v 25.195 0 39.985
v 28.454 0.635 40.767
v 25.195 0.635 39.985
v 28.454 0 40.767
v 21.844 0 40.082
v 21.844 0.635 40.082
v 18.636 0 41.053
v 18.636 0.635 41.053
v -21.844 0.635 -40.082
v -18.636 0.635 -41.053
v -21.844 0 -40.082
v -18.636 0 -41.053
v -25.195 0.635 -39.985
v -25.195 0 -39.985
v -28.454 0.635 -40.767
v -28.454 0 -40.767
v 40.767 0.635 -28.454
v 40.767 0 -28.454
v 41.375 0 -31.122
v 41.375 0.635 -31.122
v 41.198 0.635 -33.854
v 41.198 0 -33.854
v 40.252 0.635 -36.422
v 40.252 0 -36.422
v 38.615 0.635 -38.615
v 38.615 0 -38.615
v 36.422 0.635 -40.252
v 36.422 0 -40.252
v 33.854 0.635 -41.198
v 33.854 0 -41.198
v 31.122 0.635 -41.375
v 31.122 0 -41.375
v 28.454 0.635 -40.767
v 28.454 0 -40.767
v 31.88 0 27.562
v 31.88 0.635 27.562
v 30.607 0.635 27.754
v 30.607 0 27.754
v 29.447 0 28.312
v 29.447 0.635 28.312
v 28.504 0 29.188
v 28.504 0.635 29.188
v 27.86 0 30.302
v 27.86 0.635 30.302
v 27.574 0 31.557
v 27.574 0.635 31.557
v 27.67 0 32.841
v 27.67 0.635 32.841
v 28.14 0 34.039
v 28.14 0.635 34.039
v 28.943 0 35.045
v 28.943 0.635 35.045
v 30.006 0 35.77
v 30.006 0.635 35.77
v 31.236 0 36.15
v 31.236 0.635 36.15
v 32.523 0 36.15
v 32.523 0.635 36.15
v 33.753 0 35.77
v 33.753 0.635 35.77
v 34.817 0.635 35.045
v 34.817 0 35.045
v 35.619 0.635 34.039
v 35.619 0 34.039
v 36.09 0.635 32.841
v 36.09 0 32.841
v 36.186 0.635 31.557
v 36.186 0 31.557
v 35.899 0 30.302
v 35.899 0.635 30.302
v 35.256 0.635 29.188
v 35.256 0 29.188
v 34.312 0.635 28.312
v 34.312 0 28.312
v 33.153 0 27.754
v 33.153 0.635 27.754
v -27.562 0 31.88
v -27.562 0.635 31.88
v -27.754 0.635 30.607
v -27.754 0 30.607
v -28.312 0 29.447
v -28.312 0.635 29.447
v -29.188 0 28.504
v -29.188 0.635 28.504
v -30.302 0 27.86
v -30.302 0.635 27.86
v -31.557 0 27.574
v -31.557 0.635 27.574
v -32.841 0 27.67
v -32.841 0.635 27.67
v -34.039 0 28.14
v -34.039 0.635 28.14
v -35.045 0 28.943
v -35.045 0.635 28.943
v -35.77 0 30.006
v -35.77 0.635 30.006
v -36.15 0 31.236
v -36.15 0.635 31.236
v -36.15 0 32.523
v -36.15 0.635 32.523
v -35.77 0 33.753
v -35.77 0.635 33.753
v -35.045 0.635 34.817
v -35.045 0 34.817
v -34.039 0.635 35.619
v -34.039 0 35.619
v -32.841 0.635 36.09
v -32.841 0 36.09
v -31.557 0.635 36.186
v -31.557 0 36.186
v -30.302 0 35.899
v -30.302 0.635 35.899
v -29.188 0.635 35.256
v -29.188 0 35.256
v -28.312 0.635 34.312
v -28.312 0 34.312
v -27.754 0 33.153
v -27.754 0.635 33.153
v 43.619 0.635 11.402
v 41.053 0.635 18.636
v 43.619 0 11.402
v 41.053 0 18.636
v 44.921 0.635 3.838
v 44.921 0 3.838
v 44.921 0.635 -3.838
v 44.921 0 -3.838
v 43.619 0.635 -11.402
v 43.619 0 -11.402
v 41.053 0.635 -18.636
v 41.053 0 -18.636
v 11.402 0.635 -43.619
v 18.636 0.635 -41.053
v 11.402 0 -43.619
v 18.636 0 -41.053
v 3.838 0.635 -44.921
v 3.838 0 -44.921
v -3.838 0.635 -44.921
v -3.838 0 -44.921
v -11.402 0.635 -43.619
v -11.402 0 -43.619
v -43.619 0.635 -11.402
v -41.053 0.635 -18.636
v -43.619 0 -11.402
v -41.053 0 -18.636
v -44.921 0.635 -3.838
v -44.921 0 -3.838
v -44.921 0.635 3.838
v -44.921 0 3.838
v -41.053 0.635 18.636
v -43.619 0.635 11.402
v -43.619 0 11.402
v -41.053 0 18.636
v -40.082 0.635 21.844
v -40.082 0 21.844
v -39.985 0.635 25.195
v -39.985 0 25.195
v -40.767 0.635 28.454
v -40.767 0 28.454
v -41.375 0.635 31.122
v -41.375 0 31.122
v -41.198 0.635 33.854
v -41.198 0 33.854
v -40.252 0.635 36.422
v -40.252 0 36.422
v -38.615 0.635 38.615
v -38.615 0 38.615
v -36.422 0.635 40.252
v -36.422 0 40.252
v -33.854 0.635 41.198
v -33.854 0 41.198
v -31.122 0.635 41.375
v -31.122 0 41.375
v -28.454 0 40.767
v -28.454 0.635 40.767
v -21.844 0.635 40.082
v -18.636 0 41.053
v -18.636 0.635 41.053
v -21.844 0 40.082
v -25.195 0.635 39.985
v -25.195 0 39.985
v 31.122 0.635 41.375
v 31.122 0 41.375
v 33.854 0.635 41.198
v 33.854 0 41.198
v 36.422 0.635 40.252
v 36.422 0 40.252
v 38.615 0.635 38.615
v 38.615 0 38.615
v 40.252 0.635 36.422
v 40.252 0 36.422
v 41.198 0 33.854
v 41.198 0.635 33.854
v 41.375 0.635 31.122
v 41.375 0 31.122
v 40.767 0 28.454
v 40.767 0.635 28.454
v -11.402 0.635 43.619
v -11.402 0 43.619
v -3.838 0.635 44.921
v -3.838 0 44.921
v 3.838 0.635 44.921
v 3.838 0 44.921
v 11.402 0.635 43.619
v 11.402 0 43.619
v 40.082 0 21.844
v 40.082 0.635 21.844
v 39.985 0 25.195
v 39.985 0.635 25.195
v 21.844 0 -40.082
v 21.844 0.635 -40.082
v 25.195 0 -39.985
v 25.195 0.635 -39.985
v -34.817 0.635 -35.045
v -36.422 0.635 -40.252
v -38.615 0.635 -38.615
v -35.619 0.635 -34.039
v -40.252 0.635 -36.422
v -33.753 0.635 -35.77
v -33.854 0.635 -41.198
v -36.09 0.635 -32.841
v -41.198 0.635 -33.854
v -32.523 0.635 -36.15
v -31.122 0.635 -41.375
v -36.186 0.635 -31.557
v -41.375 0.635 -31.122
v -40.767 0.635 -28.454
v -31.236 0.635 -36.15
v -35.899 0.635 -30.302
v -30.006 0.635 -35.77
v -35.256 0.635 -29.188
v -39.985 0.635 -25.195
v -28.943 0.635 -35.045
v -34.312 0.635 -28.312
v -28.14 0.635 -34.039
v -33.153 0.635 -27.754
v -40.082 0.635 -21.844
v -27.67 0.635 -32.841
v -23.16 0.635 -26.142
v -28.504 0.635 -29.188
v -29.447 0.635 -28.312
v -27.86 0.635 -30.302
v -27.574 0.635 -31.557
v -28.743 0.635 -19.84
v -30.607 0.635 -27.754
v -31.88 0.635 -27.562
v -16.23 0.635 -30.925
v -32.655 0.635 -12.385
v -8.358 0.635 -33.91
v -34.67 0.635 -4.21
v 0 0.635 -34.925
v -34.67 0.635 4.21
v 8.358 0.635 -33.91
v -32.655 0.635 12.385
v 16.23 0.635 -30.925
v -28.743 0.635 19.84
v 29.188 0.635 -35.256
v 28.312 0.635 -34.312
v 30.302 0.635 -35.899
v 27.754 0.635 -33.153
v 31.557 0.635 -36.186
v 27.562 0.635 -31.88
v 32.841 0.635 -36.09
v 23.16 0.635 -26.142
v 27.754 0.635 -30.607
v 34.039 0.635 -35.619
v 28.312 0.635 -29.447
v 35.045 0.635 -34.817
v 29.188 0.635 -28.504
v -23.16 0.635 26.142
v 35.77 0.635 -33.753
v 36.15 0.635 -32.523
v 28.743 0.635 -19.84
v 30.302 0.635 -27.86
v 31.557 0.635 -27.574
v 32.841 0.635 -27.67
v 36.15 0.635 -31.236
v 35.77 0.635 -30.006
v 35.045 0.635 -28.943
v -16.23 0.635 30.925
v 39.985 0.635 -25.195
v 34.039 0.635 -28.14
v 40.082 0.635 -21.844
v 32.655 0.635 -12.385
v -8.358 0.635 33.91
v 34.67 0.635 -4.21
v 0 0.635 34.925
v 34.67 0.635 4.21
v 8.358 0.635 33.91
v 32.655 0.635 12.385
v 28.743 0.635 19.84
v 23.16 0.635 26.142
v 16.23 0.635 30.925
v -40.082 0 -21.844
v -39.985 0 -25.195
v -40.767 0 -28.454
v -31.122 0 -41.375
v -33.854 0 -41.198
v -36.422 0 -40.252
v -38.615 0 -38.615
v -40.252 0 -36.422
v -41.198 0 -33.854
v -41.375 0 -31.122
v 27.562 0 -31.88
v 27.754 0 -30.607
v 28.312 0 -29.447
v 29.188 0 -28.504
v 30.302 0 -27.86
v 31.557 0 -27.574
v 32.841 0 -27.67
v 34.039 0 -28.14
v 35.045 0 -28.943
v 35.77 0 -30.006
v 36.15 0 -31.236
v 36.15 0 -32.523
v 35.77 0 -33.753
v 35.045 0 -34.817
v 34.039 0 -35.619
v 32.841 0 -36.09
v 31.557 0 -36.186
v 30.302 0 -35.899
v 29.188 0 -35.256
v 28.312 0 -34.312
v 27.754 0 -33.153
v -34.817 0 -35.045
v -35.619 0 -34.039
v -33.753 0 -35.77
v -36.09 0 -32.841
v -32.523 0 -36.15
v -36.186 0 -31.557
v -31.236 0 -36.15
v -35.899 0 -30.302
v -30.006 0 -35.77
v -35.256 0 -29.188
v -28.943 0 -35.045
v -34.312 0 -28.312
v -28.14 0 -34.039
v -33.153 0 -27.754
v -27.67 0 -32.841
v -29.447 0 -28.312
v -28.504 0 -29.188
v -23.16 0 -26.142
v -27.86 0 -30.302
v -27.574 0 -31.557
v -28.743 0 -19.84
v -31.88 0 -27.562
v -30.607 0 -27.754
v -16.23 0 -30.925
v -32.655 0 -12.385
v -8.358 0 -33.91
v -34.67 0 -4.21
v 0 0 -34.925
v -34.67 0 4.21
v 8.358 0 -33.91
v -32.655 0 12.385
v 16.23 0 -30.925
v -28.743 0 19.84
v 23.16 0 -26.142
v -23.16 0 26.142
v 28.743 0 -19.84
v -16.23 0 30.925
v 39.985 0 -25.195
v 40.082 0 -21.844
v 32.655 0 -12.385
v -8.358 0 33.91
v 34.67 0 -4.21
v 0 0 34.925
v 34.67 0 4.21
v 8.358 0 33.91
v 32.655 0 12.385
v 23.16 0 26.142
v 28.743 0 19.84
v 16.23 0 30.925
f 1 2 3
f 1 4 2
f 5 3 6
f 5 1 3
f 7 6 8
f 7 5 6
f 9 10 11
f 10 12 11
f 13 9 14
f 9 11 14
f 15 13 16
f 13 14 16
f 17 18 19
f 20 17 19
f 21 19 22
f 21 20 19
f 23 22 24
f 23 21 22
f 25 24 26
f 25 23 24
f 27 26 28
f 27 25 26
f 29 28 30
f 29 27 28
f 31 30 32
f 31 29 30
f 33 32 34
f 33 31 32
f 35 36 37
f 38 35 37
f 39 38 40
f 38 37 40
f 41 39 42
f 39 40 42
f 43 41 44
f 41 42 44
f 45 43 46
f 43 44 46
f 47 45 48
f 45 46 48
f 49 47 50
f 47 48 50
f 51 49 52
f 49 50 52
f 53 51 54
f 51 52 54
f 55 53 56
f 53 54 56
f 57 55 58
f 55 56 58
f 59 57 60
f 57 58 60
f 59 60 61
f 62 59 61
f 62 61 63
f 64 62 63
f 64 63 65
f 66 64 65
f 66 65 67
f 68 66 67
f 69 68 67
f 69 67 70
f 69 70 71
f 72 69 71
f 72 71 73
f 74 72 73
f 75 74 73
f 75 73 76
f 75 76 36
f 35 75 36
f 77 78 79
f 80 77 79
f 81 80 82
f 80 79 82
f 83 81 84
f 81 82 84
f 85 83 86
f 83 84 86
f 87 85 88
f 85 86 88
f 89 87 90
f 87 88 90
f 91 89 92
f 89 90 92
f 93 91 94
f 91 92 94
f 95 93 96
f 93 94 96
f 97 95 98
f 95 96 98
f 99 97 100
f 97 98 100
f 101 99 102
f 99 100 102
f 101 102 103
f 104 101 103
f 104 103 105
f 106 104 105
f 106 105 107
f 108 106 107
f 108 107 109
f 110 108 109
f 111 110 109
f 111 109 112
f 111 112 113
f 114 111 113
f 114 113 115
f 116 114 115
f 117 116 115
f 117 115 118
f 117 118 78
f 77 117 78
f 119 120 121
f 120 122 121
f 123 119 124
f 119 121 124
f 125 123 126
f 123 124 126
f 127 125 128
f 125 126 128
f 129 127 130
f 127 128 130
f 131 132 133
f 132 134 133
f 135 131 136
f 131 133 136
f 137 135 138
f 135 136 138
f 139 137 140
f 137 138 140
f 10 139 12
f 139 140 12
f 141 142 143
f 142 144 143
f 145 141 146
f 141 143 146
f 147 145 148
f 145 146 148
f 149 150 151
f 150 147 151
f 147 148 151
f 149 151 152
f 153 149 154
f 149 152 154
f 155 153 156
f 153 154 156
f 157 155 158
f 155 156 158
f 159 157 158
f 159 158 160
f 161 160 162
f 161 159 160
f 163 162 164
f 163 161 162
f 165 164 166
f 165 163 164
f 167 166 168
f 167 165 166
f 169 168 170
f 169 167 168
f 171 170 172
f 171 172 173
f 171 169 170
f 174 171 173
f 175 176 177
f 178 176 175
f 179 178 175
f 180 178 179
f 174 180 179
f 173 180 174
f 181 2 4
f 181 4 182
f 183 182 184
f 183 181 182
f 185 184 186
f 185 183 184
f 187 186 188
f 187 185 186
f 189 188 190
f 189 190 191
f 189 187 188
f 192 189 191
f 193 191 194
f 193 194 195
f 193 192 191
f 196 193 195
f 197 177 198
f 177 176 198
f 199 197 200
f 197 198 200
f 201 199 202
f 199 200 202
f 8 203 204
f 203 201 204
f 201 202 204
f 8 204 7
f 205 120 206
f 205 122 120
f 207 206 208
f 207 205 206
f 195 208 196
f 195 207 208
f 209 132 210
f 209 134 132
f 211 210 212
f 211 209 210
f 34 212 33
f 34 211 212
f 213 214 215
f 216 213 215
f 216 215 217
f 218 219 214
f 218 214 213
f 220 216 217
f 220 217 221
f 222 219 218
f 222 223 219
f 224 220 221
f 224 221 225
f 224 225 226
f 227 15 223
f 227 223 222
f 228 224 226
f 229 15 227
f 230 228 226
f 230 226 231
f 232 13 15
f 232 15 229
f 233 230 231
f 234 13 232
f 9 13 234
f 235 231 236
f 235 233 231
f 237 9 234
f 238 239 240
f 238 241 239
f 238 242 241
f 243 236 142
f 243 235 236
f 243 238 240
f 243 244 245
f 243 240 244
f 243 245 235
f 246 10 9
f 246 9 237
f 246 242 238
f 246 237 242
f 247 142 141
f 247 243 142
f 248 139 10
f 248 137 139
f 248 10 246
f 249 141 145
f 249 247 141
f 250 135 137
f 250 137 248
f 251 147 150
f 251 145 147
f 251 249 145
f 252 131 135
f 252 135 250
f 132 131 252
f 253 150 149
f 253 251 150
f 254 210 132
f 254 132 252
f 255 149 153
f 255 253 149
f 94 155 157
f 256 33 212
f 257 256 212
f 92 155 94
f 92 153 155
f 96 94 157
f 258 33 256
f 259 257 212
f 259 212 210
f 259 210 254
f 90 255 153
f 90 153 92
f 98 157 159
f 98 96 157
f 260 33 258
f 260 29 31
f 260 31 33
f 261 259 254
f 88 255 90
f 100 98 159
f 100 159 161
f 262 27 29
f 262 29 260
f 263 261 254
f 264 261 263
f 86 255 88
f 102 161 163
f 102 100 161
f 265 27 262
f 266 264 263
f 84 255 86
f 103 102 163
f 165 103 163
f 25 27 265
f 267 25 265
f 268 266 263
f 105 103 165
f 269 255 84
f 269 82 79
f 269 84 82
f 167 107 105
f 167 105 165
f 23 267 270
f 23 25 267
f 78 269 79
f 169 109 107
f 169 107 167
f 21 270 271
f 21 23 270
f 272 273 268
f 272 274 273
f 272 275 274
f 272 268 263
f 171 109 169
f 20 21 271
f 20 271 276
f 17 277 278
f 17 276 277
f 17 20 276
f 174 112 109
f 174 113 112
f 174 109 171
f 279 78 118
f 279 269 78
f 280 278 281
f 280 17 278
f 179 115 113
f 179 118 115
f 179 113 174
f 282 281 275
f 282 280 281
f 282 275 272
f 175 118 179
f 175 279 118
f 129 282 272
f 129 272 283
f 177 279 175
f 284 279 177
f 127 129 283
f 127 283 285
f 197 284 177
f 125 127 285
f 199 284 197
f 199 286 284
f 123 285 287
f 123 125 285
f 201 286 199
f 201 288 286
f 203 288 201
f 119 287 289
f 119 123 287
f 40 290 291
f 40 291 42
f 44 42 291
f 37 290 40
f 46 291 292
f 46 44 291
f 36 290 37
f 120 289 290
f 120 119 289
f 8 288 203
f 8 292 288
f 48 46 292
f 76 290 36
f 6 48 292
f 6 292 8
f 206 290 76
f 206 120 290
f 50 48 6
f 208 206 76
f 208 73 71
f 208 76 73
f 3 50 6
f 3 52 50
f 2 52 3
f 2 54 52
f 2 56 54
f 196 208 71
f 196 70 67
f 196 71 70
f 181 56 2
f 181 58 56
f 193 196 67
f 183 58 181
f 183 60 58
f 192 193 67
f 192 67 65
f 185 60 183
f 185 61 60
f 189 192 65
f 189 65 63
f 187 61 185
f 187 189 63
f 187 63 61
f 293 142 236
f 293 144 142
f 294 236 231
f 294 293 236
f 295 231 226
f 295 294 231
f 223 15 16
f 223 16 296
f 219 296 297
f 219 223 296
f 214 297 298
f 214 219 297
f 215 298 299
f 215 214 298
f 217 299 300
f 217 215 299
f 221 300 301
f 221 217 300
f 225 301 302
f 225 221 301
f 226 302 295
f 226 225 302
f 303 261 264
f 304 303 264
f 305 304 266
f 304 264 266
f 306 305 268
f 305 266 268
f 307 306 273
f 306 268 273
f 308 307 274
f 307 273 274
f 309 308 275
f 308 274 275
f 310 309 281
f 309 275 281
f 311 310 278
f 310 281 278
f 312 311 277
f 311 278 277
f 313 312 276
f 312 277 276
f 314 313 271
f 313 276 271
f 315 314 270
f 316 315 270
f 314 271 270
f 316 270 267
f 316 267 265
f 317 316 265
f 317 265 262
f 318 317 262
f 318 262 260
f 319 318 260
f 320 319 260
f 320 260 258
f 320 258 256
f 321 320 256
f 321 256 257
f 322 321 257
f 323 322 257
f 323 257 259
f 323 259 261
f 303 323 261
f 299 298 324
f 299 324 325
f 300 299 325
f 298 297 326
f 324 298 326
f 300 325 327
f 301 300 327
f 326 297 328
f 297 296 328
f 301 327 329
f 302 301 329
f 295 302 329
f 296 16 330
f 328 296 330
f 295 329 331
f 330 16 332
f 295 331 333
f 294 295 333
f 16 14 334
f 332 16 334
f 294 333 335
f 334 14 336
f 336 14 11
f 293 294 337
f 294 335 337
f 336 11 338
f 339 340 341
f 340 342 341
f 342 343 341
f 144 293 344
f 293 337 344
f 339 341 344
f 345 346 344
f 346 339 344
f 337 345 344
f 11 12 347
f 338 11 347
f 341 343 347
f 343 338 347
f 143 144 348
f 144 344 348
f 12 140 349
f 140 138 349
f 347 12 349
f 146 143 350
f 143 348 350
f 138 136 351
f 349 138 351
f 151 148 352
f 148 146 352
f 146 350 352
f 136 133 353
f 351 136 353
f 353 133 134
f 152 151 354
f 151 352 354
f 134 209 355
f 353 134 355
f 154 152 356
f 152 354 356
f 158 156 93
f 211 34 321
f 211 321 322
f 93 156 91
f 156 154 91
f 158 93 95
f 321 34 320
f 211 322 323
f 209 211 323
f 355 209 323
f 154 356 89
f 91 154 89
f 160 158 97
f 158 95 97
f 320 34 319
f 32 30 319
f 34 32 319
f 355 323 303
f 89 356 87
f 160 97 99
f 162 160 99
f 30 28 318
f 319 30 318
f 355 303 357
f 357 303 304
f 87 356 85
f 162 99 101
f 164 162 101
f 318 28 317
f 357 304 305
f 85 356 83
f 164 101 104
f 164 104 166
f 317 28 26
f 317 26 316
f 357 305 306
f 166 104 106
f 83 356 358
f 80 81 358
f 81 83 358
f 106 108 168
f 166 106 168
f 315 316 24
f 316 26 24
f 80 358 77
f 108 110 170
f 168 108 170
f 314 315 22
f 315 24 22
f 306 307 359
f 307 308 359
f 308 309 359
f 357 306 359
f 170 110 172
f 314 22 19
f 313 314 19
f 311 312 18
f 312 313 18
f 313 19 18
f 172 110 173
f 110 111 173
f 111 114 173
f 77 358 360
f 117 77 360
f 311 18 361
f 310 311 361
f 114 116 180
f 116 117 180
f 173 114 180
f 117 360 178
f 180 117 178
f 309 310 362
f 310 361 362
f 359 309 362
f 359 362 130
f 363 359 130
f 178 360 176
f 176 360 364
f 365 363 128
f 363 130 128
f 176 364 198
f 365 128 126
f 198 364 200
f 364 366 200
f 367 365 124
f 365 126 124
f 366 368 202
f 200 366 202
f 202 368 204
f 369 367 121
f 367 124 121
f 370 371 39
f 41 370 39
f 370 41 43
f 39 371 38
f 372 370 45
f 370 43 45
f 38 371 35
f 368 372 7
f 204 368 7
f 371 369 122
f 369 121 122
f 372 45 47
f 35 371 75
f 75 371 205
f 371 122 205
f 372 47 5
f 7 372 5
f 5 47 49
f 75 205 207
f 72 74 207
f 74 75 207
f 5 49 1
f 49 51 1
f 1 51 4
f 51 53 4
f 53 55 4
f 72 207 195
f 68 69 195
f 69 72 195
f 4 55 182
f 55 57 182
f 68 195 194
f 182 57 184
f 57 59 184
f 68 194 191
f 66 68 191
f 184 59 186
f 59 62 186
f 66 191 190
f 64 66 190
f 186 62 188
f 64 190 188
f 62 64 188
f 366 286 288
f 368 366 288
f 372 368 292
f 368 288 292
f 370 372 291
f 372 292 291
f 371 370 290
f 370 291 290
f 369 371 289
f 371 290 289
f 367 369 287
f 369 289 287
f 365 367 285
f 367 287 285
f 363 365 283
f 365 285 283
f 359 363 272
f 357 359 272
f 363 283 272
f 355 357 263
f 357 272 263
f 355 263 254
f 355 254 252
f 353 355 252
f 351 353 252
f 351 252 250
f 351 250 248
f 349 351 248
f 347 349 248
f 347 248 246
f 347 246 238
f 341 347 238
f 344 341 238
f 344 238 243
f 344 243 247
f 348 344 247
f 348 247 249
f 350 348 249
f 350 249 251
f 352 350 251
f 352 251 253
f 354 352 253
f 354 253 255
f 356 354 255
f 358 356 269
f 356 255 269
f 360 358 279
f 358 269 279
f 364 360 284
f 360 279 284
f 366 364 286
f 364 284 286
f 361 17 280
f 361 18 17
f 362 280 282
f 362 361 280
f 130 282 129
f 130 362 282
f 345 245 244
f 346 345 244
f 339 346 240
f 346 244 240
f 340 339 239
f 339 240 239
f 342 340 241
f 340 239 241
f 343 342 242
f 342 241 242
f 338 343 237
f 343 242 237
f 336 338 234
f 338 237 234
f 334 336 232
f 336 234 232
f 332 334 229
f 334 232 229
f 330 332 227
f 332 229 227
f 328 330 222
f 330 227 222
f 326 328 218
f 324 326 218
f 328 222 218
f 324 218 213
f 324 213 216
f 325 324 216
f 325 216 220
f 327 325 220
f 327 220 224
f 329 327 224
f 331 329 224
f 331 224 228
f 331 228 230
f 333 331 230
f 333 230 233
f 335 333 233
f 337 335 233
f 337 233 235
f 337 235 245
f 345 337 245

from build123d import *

# Parameters (mm, degrees)
SKETCH1_R                = 45.085
BASE_EXTRUDE_DEPTH       = 0.635
SKETCH2_R                = 34.925
BASE_CUT_DEPTH           = 64.762980443
SKETCH3_R                = 9.525
CORNER_EXTRUDE_DEPTH     = 0.635
SKETCH4_R                = 4.318
CORNER_CUT_DEPTH         = 64.762980443
FILLET_2_R               = 12.7
CIRPATTERN_COUNT         = 4
FILLET_2_OF_CIRPATTERN_R = 12.7


with BuildPart() as part:
    # Sketch1 → Base Extrude (new body)
    with BuildSketch(Plane(origin=(0, 0, 0), x_dir=(1, 0, 0), z_dir=(0, 1, 0))):
        with Locations(Location((0, 0, 0), (0, 0, 270))):
            Circle(SKETCH1_R)
    extrude(amount=BASE_EXTRUDE_DEPTH)

    # Sketch2 → Base Cut (cut, through all)
    with BuildSketch(Plane(origin=(0, 0.635, 0), x_dir=(1, 0, 0), z_dir=(0, 1, 0))):
        with Locations(Location((0, 0, 0), (0, 0, 270))):
            Circle(SKETCH2_R)
    extrude(amount=-BASE_CUT_DEPTH, mode=Mode.SUBTRACT)

    # Sketch3 → Corner Extrude (add)
    with BuildSketch(Plane(origin=(0, 0.635, 0), x_dir=(1, 0, 0), z_dir=(0, 1, 0))):
        with Locations((-31.87990923, 31.87990923)):
            Circle(SKETCH3_R)
    corner_extrude = extrude(amount=-CORNER_EXTRUDE_DEPTH)

    # Sketch4 → Corner Cut (cut, through all)
    with BuildSketch(Plane(origin=(0, 0.635, 0), x_dir=(1, 0, 0), z_dir=(0, 1, 0))):
        with Locations(Location((-31.87990923, 31.87990923, 0), (0, 0, 270))):
            Circle(SKETCH4_R)
    corner_cut = extrude(amount=-CORNER_CUT_DEPTH, mode=Mode.SUBTRACT)

    # Fillet 2
    fillet_2_edges = [part.edges().sort_by_distance(p)[0] for p in [
        (-24.470935923, 0.3175, -37.86595463),
        (-37.86595463, 0.3175, -24.470935923),
    ]]
    fillet(fillet_2_edges, radius=FILLET_2_R)

    # CirPattern: Corner Extrude, Corner Cut ×4 about axis
    cirpattern_axis = Axis((0, 0, 0), (0, 1, 0))
    add([corner_extrude.rotate(cirpattern_axis, i * 360 / CIRPATTERN_COUNT) for i in range(1, CIRPATTERN_COUNT)])
    add([corner_cut.rotate(cirpattern_axis, i * 360 / CIRPATTERN_COUNT) for i in range(1, CIRPATTERN_COUNT)], mode=Mode.SUBTRACT)

    # Fillet 2 of CirPattern
    fillet_2_of_cirpattern_edges = [part.edges().sort_by_distance(p)[0] for p in [
        (-37.86595463, 0.3175, 24.470935923),
        (-24.470935923, 0.3175, 37.86595463),
        (24.470935923, 0.3175, 37.86595463),
        (37.86595463, 0.3175, 24.470935923),
        (37.86595463, 0.3175, -24.470935923),
        (24.470935923, 0.3175, -37.86595463),
    ]]
    fillet(fillet_2_of_cirpattern_edges, radius=FILLET_2_OF_CIRPATTERN_R)


solid = part.part
